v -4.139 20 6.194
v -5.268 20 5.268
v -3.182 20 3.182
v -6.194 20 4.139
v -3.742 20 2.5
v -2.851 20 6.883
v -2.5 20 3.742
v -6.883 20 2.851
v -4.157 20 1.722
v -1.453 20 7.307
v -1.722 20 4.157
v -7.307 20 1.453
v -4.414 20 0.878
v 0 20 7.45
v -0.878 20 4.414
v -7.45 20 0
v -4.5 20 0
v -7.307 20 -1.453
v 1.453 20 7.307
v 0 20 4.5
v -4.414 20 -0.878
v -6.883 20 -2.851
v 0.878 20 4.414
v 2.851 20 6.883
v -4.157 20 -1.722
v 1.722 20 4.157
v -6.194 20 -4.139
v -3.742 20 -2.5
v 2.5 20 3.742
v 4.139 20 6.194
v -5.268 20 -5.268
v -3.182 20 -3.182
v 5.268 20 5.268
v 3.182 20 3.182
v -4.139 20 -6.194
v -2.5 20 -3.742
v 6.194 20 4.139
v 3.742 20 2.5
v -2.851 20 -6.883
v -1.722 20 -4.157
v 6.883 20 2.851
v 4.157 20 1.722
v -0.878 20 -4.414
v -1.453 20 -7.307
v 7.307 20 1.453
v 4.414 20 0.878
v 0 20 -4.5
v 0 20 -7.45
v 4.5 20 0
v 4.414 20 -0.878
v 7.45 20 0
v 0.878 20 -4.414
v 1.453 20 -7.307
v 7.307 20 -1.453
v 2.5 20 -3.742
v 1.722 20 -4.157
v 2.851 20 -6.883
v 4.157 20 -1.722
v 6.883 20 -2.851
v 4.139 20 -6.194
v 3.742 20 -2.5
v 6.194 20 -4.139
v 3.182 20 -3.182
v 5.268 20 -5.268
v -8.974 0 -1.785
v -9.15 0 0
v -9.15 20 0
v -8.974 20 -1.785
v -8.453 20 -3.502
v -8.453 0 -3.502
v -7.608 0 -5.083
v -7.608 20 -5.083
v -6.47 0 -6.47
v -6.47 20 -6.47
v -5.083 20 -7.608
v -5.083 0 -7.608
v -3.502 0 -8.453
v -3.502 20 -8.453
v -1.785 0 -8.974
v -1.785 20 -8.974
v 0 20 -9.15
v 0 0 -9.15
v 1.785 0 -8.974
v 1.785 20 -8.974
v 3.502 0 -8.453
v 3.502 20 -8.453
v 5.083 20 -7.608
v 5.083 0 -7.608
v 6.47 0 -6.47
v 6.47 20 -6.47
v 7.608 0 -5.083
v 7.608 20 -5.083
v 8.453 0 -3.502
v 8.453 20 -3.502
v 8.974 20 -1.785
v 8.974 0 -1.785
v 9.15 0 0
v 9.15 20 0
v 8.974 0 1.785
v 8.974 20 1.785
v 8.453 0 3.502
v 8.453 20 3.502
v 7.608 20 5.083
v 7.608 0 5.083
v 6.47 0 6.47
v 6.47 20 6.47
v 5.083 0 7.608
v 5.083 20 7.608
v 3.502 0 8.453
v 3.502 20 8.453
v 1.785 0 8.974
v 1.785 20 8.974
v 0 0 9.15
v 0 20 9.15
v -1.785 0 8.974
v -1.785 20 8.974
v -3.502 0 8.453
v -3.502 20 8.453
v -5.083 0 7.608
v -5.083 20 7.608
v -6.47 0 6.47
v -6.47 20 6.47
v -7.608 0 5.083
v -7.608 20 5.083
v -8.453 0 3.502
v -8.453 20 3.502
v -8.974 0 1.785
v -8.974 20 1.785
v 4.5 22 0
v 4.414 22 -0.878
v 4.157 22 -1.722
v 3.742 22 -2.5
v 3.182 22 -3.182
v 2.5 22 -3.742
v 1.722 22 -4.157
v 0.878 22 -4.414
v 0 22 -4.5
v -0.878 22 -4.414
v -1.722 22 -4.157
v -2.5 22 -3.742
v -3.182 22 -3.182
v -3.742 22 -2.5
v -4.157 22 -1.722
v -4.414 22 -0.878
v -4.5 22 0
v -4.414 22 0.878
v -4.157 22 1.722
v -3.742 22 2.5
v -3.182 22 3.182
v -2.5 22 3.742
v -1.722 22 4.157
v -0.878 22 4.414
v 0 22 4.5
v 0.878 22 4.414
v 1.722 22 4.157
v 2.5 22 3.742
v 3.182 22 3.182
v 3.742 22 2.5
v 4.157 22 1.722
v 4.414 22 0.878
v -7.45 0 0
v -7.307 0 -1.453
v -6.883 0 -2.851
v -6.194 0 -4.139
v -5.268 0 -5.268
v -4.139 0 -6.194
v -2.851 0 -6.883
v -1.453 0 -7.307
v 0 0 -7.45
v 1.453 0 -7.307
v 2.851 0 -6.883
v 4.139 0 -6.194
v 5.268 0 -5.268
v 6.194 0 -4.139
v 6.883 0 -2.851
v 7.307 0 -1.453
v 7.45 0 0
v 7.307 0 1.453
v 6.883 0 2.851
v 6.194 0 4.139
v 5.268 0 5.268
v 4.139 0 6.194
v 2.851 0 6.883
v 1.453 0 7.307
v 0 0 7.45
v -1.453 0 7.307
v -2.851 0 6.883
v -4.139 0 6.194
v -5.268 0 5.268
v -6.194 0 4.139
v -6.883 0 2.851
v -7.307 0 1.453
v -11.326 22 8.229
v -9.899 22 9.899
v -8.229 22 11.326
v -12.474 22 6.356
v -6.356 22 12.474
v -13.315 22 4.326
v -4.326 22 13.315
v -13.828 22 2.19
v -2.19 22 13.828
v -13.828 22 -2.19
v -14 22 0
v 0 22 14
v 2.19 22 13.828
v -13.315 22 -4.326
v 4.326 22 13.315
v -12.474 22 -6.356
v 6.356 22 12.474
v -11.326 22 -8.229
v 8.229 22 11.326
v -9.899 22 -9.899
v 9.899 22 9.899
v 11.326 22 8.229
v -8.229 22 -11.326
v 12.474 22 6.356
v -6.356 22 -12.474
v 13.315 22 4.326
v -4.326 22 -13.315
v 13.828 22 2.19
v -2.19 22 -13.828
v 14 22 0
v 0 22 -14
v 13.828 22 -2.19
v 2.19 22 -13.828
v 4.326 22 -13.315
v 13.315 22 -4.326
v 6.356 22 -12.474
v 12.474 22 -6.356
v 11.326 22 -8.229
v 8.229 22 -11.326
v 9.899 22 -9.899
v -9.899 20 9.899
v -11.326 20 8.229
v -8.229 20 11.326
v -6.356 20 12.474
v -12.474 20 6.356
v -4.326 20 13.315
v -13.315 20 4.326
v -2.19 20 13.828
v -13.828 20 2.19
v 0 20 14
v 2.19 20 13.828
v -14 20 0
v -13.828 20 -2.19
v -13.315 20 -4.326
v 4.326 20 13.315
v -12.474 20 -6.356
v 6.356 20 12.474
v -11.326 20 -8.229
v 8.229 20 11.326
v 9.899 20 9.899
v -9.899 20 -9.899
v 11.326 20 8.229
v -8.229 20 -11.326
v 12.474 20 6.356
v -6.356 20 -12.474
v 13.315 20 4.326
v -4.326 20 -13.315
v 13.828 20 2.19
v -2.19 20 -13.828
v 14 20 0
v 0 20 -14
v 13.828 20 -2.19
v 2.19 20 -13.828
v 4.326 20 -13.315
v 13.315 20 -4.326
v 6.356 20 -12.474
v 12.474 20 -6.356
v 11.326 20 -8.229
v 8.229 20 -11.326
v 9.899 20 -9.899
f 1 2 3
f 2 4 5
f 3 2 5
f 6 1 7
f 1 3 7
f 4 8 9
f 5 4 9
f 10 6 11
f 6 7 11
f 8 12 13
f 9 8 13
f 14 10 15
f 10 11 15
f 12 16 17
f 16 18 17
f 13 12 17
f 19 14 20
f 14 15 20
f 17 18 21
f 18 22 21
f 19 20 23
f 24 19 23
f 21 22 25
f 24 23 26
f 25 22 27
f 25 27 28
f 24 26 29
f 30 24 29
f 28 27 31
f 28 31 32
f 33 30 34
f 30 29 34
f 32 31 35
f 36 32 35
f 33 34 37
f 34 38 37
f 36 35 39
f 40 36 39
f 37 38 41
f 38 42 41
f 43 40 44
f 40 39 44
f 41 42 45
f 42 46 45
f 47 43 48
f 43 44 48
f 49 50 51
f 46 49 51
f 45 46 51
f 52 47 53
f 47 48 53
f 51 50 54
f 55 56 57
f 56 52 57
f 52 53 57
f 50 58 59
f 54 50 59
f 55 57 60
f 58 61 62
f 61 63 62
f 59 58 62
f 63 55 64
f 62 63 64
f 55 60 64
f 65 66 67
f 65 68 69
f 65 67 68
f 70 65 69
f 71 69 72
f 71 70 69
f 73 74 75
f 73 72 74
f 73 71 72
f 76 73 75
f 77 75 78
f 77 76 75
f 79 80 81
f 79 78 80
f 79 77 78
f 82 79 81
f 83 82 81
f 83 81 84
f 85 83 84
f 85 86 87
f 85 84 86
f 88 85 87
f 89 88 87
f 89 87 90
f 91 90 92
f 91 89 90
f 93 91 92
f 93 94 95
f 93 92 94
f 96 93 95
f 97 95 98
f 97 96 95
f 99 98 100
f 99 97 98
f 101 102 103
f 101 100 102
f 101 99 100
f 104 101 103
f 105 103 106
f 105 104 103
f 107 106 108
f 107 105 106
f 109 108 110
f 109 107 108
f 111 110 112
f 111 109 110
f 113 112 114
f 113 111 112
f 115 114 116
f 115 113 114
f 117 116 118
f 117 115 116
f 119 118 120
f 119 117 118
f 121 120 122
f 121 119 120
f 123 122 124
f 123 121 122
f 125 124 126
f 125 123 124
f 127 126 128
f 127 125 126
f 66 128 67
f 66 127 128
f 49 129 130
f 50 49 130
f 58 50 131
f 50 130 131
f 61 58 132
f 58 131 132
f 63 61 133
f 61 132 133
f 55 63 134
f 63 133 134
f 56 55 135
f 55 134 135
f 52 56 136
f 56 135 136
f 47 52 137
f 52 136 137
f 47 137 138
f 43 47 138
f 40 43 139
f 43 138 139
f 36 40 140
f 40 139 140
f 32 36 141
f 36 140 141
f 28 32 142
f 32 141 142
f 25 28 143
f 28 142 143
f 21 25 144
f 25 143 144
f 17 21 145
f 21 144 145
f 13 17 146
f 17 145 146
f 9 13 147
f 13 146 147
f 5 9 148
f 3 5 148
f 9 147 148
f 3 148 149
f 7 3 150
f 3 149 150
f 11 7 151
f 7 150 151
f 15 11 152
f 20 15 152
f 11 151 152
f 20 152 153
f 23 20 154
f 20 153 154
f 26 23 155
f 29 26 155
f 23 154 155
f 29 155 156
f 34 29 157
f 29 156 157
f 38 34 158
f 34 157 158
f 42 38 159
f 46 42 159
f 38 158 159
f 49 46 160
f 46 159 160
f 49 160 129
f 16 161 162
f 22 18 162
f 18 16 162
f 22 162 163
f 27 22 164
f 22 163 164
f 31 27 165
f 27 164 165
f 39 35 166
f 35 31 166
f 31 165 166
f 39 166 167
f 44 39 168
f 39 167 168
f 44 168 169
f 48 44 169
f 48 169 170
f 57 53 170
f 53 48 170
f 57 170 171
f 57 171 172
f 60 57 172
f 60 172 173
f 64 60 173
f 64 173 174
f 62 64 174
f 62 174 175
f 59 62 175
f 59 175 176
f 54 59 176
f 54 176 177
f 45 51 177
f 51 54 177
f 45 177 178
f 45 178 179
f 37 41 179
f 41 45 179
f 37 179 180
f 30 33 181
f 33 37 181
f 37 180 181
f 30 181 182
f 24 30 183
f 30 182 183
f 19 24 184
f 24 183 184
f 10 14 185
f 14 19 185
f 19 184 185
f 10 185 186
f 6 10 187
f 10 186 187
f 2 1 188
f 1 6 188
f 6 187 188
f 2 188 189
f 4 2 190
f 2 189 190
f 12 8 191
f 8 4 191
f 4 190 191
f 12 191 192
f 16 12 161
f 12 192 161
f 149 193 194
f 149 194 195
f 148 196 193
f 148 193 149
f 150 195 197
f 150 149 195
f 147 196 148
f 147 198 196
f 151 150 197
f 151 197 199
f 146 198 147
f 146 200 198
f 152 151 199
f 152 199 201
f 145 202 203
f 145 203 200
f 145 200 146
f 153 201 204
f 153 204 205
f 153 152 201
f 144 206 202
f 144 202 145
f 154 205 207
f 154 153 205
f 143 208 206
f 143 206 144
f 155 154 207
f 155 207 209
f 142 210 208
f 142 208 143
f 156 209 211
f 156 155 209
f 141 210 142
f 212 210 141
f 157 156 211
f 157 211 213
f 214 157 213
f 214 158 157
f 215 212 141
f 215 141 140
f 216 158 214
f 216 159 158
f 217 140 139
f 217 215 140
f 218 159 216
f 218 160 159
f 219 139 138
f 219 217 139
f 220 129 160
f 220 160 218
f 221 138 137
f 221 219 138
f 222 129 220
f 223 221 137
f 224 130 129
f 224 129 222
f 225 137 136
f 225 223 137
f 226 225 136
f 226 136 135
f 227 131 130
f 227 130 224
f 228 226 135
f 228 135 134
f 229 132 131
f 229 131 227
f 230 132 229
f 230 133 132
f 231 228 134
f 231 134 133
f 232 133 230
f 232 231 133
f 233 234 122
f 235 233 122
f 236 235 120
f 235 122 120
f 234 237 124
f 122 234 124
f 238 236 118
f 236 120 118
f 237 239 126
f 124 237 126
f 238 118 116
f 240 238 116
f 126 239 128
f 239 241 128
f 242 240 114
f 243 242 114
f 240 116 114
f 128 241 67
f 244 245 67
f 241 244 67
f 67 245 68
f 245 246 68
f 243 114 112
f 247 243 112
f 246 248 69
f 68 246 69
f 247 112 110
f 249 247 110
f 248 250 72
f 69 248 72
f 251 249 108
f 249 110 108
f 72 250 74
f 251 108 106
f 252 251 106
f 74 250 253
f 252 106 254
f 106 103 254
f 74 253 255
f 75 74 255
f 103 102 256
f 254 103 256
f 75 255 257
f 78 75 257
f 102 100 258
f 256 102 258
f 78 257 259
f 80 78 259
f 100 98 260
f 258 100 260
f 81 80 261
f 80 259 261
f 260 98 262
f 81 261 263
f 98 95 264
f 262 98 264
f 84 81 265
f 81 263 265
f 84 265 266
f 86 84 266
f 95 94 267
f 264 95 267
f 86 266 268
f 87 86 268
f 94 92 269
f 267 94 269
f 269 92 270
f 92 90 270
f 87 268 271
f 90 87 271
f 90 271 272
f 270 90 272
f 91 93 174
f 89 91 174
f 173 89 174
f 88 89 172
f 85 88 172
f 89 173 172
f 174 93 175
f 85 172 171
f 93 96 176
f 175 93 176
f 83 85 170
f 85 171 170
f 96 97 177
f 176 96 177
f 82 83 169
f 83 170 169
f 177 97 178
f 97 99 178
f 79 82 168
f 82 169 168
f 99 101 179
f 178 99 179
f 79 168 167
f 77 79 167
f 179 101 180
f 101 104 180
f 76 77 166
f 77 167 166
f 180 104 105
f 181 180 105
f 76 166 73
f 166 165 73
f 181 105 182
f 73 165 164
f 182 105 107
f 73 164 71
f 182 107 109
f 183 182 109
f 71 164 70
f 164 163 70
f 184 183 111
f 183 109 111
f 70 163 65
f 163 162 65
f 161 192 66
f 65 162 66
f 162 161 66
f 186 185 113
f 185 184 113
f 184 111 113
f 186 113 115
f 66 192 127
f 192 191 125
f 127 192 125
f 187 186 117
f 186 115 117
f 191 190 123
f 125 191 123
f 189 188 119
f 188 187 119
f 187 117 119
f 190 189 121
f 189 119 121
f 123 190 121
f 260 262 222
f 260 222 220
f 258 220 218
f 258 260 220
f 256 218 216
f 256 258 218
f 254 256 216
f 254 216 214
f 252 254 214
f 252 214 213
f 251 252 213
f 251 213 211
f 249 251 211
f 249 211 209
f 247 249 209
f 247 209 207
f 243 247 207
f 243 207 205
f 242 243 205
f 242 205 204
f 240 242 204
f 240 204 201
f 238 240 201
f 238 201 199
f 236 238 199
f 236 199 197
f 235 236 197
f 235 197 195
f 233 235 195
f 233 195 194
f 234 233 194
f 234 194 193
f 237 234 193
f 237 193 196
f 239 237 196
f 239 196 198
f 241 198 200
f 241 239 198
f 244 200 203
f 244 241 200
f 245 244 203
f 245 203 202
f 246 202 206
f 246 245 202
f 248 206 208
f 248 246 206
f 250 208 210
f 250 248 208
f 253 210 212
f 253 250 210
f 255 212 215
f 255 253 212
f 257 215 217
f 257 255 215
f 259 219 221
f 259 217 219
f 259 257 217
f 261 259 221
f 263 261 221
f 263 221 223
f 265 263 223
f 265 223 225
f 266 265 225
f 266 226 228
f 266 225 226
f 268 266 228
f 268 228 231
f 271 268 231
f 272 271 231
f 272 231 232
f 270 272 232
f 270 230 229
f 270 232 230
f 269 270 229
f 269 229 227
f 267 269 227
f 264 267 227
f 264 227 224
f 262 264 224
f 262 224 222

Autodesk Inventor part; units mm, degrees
ref_plane "YZ Plane" through (0, 0, 0) normal (1, 0, 0) x (0, 1, 0)
ref_plane "XZ Plane" through (0, 0, 0) normal (0, 1, 0) x (-1, 0, 0)
ref_plane "XY Plane" through (0, 0, 0) normal (0, 0, 1) x (1, 0, 0)
sketch "Sketch1" plane through (0, 0, 0) normal (0, 1, 0) x (-1, 0, 0)
  circle A0 centre (0, 0) radius 9.15
  circle A1 centre (0, 0) radius 7.45
  dimension "d0" = 18.3
  dimension "d4" = 1.7
extrude "Extrusion2" add sketch "Sketch1" along normal blind 20
sketch "Sketch2" plane through (0, 20, 0) normal (0, 1, 0) x (1, 0, 0)
  circle A0 centre (0, 0) radius 14
  circle A1 centre (0, 0) radius 4.5
  dimension "d7" = 28
  dimension "d12" = 9
extrude "Extrusion3" add sketch "Sketch2" along normal blind 2 contours A0 | A1
thread "Thread1" size "M20x2.5" class "6g" standard "ANSI Metric M Profile" full length
sketch "Sketch3" plane through (0, 22, 0) normal (0, 1, 0) x (1, 0, 0)
  circle A0 centre (0, 0) radius 4.5
  dimension "d13" = 9
extrude "Extrusion4" cut sketch "Sketch3" against normal through all
properties part number "Tapa"
